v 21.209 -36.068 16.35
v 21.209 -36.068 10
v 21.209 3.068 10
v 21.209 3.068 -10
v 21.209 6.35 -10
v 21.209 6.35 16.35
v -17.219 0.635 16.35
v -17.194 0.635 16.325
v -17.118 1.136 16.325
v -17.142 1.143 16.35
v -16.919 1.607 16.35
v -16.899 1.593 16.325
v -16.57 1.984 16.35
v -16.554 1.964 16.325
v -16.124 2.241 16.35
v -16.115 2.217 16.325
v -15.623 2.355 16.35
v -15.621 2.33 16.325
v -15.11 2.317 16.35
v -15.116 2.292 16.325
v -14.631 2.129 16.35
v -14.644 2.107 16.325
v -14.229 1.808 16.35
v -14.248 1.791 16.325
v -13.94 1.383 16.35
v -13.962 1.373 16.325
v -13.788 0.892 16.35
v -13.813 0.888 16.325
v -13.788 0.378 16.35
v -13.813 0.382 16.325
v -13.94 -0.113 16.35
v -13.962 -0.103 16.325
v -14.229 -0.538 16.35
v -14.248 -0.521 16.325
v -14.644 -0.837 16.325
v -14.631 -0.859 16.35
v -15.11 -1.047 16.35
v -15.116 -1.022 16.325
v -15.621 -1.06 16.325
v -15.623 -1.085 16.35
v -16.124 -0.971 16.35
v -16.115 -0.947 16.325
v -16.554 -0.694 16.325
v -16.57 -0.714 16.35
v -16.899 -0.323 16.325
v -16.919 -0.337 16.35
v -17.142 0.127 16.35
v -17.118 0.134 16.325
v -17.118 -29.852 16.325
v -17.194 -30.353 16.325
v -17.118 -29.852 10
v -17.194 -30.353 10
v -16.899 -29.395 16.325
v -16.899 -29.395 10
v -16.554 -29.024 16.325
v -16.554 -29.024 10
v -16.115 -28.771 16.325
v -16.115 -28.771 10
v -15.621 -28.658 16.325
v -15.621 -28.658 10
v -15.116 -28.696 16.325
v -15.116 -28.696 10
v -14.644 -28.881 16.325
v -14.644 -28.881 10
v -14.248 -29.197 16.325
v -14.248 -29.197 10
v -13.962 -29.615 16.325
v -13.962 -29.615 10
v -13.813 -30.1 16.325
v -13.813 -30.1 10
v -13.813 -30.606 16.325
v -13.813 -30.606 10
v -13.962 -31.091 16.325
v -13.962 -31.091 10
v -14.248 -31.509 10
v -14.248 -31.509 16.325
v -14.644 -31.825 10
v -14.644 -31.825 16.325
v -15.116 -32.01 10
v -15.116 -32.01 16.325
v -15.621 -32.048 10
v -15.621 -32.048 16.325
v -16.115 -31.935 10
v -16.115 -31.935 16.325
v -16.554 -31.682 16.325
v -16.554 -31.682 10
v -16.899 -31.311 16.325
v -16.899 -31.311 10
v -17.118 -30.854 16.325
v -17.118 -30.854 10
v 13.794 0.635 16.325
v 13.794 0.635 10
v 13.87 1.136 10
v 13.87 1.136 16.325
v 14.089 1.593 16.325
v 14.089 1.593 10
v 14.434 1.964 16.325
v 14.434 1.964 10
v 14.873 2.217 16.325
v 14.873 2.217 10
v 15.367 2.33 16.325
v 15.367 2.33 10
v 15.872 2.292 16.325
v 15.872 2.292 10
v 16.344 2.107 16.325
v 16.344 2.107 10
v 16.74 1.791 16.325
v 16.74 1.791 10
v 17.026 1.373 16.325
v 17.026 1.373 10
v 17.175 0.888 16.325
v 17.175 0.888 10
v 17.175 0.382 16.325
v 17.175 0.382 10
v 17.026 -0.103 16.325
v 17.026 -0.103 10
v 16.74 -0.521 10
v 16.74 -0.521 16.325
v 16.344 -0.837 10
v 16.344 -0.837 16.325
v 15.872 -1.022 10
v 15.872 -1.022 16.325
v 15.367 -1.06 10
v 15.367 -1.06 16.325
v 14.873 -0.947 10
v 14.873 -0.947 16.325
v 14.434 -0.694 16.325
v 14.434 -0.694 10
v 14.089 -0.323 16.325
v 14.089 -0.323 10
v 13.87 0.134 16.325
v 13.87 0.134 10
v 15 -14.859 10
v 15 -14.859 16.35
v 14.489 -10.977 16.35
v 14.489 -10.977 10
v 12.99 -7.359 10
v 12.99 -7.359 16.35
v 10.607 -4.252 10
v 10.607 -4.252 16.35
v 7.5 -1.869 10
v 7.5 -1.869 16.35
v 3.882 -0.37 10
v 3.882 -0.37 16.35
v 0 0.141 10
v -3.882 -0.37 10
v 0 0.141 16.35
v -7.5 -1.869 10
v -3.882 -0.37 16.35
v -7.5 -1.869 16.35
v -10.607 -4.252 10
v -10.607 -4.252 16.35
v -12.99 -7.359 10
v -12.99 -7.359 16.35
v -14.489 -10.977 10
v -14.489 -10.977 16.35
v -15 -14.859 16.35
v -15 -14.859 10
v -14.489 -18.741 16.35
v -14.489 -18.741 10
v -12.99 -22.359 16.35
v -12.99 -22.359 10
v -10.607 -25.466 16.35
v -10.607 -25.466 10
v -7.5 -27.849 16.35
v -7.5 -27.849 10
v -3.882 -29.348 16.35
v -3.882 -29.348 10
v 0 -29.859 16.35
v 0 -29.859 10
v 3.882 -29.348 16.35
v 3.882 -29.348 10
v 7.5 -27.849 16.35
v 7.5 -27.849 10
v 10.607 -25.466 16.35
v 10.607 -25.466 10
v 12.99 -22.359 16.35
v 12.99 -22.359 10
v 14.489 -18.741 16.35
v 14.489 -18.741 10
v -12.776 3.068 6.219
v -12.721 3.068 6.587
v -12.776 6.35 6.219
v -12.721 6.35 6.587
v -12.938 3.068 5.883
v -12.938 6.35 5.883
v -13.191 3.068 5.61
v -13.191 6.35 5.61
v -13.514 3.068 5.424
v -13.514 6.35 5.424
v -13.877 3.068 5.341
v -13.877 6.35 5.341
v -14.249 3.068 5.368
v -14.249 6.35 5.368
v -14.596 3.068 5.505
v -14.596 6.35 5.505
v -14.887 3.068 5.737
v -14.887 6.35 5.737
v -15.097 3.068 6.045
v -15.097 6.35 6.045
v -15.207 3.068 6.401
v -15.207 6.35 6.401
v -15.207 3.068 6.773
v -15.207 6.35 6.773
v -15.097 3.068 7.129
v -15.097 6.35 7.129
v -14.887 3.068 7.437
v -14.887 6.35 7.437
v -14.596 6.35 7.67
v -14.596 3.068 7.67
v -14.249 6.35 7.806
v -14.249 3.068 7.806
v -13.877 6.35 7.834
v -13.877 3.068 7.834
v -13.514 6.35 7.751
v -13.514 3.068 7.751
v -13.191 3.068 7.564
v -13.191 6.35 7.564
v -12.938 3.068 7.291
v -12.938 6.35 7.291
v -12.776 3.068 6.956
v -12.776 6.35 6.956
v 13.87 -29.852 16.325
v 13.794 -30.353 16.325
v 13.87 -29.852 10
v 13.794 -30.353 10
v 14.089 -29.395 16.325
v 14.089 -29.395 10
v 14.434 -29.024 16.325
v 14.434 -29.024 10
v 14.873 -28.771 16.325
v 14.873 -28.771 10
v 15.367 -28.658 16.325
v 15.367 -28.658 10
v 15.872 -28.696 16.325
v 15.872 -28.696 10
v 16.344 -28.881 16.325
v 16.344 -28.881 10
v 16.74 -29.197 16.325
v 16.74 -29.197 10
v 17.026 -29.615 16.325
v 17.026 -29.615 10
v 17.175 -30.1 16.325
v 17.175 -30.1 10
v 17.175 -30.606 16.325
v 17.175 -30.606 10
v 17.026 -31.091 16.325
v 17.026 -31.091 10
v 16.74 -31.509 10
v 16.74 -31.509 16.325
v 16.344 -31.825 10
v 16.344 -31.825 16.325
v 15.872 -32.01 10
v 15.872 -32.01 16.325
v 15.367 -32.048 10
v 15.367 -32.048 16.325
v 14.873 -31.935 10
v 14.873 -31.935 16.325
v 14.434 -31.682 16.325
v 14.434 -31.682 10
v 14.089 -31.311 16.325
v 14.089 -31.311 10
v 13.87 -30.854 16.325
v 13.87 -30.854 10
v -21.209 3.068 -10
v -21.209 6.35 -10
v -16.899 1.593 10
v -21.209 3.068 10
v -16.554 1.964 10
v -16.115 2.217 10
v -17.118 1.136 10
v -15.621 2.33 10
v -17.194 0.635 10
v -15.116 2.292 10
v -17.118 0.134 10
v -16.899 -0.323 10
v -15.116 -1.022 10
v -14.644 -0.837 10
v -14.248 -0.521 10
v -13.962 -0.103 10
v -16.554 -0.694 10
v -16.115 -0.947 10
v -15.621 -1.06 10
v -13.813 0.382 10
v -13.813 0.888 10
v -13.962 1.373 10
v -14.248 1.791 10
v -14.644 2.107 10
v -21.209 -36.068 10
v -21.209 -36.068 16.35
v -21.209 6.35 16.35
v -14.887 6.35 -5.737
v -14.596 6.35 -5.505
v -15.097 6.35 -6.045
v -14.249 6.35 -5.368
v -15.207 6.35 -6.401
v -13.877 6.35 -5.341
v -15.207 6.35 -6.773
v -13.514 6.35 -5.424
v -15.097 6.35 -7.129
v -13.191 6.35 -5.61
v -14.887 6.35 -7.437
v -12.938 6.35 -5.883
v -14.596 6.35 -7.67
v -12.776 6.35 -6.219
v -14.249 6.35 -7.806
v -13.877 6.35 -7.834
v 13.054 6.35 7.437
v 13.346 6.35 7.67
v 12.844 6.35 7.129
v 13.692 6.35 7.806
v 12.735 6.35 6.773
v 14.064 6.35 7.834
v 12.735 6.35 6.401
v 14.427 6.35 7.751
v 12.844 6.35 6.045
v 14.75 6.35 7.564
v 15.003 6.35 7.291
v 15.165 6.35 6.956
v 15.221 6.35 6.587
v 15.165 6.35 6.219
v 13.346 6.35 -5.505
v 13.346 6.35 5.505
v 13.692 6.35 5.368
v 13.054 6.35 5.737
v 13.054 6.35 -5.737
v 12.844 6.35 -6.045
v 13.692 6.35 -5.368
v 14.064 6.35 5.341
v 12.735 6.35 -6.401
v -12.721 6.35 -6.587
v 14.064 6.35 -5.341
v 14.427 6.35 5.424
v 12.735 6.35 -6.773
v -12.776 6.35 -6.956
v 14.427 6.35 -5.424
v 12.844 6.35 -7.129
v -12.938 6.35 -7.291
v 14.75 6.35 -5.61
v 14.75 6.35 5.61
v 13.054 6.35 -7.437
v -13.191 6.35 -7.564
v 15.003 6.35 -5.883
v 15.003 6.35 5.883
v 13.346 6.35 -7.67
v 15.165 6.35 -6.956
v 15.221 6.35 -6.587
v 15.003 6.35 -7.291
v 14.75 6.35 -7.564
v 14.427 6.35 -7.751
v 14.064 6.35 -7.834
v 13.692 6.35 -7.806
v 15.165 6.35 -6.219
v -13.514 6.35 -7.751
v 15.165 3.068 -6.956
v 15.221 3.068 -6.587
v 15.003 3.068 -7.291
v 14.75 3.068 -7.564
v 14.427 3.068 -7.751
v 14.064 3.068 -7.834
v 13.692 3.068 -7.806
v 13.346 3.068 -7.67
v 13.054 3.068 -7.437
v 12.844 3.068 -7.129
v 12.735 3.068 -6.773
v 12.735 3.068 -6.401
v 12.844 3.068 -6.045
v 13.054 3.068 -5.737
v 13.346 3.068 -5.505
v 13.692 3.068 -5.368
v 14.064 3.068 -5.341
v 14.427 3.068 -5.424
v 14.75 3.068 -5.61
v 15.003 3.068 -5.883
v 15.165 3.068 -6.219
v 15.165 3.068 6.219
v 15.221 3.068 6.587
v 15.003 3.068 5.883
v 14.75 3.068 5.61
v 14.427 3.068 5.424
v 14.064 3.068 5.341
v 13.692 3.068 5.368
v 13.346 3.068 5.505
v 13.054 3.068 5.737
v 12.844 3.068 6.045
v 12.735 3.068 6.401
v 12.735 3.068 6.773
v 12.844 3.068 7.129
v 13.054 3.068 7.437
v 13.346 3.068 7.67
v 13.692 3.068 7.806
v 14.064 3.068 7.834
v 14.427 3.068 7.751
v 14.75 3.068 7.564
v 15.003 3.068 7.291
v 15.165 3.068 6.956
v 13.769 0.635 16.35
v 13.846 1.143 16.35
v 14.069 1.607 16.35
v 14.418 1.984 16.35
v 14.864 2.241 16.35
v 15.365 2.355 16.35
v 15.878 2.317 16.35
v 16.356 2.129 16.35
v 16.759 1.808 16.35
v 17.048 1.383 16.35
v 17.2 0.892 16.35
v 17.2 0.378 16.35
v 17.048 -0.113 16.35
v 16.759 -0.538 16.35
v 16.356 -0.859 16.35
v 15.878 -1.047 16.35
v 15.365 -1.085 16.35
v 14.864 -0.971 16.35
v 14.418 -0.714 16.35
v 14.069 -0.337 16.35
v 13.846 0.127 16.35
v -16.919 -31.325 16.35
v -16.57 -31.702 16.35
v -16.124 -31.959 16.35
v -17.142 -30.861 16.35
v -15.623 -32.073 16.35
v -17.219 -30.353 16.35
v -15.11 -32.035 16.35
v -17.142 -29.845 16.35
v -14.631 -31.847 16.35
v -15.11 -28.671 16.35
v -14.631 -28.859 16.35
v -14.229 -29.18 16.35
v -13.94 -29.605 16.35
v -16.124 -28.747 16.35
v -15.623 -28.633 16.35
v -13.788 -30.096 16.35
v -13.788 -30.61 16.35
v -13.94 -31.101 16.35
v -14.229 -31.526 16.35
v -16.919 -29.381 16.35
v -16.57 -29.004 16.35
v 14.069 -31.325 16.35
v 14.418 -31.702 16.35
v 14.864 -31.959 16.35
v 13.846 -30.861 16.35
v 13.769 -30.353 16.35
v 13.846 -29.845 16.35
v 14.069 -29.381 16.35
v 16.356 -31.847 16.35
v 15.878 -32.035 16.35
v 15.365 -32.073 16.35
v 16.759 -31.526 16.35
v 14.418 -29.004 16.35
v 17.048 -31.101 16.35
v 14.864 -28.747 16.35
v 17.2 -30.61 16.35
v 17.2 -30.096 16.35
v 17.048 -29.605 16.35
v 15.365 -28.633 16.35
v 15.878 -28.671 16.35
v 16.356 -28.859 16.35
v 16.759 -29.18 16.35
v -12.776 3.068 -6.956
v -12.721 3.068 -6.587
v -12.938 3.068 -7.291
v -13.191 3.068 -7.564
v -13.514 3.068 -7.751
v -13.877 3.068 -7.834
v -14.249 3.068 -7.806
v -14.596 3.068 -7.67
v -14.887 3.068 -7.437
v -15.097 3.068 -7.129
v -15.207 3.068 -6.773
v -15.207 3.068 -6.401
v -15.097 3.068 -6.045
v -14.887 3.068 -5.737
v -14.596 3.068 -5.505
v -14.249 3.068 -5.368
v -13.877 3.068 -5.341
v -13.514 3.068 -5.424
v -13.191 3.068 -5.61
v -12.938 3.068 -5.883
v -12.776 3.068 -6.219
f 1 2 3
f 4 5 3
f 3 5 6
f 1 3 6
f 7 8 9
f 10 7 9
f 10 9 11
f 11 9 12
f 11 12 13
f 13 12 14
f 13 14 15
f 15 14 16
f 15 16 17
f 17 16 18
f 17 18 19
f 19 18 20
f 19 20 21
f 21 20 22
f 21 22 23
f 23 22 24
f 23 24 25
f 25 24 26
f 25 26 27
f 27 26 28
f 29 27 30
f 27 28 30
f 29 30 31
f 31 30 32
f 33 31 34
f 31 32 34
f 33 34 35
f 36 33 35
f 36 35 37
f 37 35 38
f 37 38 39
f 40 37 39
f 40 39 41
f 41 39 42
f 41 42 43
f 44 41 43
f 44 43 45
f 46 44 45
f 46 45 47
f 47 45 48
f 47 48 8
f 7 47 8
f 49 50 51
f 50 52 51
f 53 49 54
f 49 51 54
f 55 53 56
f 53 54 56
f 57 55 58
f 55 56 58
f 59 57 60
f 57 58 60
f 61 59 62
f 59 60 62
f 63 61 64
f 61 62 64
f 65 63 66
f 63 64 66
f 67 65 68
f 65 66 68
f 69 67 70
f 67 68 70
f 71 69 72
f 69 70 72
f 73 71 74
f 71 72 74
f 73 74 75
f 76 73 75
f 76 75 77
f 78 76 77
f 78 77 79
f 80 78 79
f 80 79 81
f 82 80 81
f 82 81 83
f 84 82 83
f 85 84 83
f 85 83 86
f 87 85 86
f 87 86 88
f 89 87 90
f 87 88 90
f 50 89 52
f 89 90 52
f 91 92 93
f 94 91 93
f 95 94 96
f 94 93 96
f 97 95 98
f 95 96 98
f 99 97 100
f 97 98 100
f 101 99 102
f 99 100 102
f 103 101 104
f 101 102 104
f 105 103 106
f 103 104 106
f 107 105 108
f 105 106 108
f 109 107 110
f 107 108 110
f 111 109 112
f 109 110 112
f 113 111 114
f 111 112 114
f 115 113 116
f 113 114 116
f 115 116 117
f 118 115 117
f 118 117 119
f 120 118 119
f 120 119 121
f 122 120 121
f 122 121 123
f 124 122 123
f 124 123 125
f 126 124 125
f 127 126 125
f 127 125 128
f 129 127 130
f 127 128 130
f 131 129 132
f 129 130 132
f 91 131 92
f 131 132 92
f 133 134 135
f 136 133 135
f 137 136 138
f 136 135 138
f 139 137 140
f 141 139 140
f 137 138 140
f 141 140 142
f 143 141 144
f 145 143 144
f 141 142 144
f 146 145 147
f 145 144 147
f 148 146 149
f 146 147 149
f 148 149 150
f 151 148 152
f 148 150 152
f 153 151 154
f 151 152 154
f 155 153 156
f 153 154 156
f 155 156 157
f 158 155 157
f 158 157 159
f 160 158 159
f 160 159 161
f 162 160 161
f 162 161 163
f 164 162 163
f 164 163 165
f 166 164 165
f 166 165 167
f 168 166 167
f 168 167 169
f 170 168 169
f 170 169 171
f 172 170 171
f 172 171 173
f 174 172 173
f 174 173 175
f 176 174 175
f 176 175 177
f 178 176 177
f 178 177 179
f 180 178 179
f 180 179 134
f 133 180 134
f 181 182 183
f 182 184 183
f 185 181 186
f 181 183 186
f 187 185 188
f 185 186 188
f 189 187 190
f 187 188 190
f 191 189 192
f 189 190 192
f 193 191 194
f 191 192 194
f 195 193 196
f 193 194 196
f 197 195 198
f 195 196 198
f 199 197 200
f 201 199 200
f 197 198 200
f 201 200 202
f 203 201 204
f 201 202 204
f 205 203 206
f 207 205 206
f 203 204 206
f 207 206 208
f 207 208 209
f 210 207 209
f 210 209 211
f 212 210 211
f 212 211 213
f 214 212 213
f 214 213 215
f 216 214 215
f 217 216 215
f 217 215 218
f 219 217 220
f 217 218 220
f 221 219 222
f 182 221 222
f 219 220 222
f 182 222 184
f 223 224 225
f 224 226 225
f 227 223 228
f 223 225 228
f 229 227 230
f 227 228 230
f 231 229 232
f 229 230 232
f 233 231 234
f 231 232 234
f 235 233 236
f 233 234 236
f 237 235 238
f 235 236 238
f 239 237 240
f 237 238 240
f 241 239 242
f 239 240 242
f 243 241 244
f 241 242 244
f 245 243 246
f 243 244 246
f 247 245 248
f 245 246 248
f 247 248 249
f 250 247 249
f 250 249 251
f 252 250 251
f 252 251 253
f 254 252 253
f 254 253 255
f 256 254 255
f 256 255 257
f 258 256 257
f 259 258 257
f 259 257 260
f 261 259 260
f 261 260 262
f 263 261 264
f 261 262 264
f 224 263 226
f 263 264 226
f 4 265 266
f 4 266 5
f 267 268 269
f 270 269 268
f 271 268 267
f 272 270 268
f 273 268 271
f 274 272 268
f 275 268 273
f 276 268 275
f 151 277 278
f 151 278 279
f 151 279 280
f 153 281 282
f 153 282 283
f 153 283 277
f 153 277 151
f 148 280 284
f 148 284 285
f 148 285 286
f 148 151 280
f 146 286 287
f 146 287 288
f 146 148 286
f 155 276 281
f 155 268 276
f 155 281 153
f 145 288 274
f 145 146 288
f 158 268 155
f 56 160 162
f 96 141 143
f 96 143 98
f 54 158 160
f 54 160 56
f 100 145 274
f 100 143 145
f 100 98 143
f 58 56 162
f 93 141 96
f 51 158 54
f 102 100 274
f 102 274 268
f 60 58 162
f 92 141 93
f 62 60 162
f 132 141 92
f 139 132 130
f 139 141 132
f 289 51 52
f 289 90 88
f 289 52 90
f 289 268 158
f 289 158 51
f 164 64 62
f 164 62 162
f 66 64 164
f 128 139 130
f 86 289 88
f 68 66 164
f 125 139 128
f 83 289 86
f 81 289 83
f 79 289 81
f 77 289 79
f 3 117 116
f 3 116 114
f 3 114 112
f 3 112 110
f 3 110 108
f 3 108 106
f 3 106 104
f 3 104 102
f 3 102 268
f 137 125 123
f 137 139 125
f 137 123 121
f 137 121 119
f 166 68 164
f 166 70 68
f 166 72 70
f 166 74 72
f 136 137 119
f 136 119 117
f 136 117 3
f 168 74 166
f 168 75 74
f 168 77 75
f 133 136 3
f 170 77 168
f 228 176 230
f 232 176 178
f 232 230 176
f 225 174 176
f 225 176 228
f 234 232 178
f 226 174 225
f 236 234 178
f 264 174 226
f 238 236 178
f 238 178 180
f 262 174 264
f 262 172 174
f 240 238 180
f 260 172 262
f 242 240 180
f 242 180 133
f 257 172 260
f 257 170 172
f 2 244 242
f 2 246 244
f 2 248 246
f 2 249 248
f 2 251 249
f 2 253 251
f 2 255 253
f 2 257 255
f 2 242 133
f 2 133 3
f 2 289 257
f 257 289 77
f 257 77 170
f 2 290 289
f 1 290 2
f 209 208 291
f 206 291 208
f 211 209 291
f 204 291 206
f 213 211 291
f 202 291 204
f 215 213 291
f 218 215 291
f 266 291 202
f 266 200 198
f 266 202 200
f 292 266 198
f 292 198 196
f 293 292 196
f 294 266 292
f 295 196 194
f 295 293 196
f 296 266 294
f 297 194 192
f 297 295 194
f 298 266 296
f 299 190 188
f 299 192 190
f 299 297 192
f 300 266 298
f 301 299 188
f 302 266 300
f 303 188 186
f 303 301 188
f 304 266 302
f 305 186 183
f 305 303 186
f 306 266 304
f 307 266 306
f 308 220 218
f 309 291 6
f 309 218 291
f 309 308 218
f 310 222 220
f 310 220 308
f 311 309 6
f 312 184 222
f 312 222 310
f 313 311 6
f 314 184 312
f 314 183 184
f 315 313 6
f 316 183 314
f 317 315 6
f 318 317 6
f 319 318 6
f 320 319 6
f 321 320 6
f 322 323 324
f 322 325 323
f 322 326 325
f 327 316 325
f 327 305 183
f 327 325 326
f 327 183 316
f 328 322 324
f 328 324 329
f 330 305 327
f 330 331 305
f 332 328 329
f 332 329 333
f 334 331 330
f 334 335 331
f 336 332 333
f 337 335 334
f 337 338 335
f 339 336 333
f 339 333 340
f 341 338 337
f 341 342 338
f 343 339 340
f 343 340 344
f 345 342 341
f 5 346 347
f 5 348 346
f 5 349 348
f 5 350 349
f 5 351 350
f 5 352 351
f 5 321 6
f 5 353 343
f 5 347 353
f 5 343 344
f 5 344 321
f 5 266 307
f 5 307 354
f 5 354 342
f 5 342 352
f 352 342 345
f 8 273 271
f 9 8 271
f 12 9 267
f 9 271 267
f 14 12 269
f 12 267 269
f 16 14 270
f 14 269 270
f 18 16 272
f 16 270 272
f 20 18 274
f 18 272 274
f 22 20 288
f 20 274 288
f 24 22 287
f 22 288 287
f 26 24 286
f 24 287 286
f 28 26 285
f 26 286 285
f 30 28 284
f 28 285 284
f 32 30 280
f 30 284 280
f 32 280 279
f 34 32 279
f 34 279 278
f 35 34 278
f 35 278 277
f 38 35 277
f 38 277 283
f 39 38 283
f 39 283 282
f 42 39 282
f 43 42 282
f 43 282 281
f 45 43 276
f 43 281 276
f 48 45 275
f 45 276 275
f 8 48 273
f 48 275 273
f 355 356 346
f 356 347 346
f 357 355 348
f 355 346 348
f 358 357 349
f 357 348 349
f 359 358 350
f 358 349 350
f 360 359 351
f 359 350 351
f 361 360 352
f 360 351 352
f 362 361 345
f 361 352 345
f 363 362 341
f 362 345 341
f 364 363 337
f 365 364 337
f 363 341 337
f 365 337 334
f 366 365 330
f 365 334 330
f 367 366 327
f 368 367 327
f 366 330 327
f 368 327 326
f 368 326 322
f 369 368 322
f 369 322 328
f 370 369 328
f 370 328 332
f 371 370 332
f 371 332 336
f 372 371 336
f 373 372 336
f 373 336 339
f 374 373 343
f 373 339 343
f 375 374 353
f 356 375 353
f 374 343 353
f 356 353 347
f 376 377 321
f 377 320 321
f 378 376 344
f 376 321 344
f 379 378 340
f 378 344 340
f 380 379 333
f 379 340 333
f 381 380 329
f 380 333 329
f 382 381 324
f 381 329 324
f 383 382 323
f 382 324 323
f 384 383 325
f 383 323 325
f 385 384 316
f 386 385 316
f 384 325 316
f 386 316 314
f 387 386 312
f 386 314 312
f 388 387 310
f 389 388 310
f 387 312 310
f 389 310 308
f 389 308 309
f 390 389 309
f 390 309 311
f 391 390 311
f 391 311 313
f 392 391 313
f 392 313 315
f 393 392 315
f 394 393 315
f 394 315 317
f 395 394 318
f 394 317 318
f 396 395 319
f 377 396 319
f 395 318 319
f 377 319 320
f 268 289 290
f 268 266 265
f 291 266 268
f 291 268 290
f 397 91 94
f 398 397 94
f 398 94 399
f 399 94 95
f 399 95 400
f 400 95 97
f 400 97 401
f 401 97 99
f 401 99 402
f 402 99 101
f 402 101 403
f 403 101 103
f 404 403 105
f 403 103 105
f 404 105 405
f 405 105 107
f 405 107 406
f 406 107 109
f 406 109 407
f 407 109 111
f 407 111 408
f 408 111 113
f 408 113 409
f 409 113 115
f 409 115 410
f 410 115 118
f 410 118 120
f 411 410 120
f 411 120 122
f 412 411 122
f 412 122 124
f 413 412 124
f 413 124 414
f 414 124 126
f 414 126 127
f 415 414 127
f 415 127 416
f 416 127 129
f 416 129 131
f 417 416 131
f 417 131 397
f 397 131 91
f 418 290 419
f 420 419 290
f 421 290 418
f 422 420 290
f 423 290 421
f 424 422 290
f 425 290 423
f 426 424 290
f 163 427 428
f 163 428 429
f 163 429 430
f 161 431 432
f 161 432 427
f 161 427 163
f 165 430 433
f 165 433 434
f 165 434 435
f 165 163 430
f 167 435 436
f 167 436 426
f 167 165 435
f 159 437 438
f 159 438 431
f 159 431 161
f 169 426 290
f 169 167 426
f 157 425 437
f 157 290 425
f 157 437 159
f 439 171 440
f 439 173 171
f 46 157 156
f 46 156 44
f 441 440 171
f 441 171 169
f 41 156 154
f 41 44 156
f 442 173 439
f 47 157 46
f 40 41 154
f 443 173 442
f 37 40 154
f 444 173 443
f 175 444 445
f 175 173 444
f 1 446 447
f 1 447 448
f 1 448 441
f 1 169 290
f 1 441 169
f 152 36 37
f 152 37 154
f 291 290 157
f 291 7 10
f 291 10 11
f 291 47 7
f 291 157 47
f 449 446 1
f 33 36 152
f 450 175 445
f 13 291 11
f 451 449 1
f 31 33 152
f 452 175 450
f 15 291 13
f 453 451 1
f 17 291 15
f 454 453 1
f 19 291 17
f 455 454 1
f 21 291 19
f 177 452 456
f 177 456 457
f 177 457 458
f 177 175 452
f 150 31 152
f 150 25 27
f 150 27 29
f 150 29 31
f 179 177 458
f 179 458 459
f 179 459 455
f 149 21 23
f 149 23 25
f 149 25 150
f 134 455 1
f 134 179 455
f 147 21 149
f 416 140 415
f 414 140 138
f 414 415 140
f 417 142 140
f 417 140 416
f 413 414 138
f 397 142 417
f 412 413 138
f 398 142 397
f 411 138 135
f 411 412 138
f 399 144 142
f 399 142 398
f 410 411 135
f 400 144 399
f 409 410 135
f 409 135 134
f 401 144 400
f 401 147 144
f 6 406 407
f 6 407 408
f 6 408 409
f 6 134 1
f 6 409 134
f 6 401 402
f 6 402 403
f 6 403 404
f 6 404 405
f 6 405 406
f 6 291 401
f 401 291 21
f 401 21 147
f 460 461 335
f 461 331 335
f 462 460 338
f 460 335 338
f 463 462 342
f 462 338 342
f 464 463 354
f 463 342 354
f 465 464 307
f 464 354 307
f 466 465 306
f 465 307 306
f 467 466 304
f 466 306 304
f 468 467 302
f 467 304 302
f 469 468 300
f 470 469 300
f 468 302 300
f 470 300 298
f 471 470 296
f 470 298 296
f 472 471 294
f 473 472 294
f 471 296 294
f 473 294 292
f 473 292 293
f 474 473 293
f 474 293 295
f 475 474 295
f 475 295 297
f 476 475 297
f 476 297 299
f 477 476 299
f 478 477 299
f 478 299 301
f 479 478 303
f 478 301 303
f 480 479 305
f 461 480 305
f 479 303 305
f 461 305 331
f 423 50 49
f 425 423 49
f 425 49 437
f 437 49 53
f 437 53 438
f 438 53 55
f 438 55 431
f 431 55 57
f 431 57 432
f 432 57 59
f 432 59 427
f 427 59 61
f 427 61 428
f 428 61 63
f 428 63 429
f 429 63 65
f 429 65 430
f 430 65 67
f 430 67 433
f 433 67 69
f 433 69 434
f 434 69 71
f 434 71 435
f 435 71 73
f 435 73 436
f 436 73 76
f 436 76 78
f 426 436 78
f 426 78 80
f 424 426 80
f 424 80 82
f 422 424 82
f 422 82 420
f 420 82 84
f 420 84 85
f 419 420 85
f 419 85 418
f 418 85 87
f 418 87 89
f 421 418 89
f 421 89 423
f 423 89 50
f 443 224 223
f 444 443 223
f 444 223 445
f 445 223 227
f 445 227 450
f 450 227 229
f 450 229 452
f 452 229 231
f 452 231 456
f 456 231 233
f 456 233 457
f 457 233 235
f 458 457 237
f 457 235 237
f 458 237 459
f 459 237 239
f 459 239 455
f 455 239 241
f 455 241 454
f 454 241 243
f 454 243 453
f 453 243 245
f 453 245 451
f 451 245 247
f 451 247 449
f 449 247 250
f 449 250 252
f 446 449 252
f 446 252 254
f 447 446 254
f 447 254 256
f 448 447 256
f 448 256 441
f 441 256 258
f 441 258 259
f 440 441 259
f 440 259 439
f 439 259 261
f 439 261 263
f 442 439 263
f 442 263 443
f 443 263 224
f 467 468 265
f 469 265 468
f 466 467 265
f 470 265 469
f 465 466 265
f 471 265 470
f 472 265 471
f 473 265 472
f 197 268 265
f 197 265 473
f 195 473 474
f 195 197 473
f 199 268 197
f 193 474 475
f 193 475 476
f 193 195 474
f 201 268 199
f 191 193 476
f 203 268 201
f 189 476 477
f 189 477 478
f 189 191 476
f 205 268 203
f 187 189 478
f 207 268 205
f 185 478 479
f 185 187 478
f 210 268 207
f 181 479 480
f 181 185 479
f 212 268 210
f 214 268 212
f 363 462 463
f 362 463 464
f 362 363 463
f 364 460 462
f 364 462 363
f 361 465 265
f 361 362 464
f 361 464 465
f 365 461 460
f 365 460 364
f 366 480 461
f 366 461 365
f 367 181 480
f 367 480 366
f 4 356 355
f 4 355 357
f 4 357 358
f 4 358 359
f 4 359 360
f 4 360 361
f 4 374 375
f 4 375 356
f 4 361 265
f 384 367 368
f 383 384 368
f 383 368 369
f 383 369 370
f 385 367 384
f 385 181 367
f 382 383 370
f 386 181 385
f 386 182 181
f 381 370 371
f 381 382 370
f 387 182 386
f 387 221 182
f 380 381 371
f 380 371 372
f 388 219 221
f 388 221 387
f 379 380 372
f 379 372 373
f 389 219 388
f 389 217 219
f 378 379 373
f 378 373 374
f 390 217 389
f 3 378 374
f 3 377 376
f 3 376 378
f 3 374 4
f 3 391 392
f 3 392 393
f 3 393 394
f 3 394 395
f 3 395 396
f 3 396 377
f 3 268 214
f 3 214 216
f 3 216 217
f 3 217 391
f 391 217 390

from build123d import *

# Parameters (mm, degrees)
SKETCH1_W                             = 42.418
SKETCH1_H                             = 20
BOSS_EXTRUDE1_DEPTH                   = 6.35
TAP_DRILL_FOR_M3X0_5_TAP2_D           = 2.5
TAP_DRILL_FOR_M3X0_5_TAP2_DEPTH       = 9.248924226
TAP_DRILL_FOR_M3X0_5_TAP2_CSINK_D     = 2.55
TAP_DRILL_FOR_M3X0_5_TAP2_CSINK_ANGLE = 90
TAP_DRILL_FOR_M3X0_5_TAP2_TIP         = 0.751075774
SKETCH12_W                            = 42.418
SKETCH12_H                            = 6.35
BOSS_EXTRUDE2_DEPTH                   = 6.35
SKETCH13_W                            = 42.418
SKETCH13_H                            = 6.35
BOSS_EXTRUDE3_DEPTH                   = 36.068
M3_CLEARANCE_HOLE1_D                  = 3.4
M3_CLEARANCE_HOLE1_CSINK_D            = 3.45
M3_CLEARANCE_HOLE1_CSINK_ANGLE        = 90
SKETCH17_W                            = 42.418
SKETCH17_H                            = 20
CUT_EXTRUDE1_DEPTH                    = 3.068
SKETCH19_R                            = 15
CUT_EXTRUDE2_DEPTH                    = 50.44739432


with BuildPart() as part:
    # Sketch1 → Boss-Extrude1 (new body)
    with BuildSketch(Plane(origin=(0, 0, 0), x_dir=(1, 0, 0), z_dir=(0, 1, 0))):
        Rectangle(SKETCH1_W, SKETCH1_H)
    extrude(amount=BOSS_EXTRUDE1_DEPTH)

    # Tap Drill for M3x0.5 Tap2
    with Locations(Plane(origin=(0, 0, 0), x_dir=(-1, 0, 0), z_dir=(0, -1, 0))):
        with Locations((-13.970620706, 6.587119009), (-13.970620706, -6.587119009), (13.970620706, 6.587119009), (13.970620706, -6.587119009)):
            CounterSinkHole(TAP_DRILL_FOR_M3X0_5_TAP2_D / 2, TAP_DRILL_FOR_M3X0_5_TAP2_CSINK_D / 2, depth=TAP_DRILL_FOR_M3X0_5_TAP2_DEPTH, counter_sink_angle=TAP_DRILL_FOR_M3X0_5_TAP2_CSINK_ANGLE)
            with Locations((0, 0, -(TAP_DRILL_FOR_M3X0_5_TAP2_DEPTH + TAP_DRILL_FOR_M3X0_5_TAP2_TIP / 2))):  # 118° drill point
                Cone(0, TAP_DRILL_FOR_M3X0_5_TAP2_D / 2, TAP_DRILL_FOR_M3X0_5_TAP2_TIP, mode=Mode.SUBTRACT)

    # Sketch12 → Boss-Extrude2 (add)
    with BuildSketch(Plane.XY.offset(10)):
        with Locations((0, 3.175)):
            Rectangle(SKETCH12_W, SKETCH12_H)
    extrude(amount=BOSS_EXTRUDE2_DEPTH)

    # Sketch13 → Boss-Extrude3 (add)
    with BuildSketch(Plane.XZ):
        with Locations((0, 13.175)):
            Rectangle(SKETCH13_W, SKETCH13_H)
    extrude(amount=BOSS_EXTRUDE3_DEPTH)

    # M3 Clearance Hole1 (through all)
    with Locations(Plane.XY.offset(16.35)):
        with Locations((-15.494, 0.635), (15.494, 0.635), (15.494, -30.353), (-15.494, -30.353)):
            CounterSinkHole(M3_CLEARANCE_HOLE1_D / 2, M3_CLEARANCE_HOLE1_CSINK_D / 2, counter_sink_angle=M3_CLEARANCE_HOLE1_CSINK_ANGLE)

    # Sketch17 → Cut-Extrude1 (cut)
    with BuildSketch(Plane.XZ):
        Rectangle(SKETCH17_W, SKETCH17_H)
    extrude(amount=-CUT_EXTRUDE1_DEPTH, mode=Mode.SUBTRACT)

    # Sketch19 → Cut-Extrude2 (cut, through all)
    with BuildSketch(Plane.XY.offset(16.35)):
        with Locations((0, -14.859)):
            Circle(SKETCH19_R)
    extrude(amount=-CUT_EXTRUDE2_DEPTH, mode=Mode.SUBTRACT)


solid = part.part
